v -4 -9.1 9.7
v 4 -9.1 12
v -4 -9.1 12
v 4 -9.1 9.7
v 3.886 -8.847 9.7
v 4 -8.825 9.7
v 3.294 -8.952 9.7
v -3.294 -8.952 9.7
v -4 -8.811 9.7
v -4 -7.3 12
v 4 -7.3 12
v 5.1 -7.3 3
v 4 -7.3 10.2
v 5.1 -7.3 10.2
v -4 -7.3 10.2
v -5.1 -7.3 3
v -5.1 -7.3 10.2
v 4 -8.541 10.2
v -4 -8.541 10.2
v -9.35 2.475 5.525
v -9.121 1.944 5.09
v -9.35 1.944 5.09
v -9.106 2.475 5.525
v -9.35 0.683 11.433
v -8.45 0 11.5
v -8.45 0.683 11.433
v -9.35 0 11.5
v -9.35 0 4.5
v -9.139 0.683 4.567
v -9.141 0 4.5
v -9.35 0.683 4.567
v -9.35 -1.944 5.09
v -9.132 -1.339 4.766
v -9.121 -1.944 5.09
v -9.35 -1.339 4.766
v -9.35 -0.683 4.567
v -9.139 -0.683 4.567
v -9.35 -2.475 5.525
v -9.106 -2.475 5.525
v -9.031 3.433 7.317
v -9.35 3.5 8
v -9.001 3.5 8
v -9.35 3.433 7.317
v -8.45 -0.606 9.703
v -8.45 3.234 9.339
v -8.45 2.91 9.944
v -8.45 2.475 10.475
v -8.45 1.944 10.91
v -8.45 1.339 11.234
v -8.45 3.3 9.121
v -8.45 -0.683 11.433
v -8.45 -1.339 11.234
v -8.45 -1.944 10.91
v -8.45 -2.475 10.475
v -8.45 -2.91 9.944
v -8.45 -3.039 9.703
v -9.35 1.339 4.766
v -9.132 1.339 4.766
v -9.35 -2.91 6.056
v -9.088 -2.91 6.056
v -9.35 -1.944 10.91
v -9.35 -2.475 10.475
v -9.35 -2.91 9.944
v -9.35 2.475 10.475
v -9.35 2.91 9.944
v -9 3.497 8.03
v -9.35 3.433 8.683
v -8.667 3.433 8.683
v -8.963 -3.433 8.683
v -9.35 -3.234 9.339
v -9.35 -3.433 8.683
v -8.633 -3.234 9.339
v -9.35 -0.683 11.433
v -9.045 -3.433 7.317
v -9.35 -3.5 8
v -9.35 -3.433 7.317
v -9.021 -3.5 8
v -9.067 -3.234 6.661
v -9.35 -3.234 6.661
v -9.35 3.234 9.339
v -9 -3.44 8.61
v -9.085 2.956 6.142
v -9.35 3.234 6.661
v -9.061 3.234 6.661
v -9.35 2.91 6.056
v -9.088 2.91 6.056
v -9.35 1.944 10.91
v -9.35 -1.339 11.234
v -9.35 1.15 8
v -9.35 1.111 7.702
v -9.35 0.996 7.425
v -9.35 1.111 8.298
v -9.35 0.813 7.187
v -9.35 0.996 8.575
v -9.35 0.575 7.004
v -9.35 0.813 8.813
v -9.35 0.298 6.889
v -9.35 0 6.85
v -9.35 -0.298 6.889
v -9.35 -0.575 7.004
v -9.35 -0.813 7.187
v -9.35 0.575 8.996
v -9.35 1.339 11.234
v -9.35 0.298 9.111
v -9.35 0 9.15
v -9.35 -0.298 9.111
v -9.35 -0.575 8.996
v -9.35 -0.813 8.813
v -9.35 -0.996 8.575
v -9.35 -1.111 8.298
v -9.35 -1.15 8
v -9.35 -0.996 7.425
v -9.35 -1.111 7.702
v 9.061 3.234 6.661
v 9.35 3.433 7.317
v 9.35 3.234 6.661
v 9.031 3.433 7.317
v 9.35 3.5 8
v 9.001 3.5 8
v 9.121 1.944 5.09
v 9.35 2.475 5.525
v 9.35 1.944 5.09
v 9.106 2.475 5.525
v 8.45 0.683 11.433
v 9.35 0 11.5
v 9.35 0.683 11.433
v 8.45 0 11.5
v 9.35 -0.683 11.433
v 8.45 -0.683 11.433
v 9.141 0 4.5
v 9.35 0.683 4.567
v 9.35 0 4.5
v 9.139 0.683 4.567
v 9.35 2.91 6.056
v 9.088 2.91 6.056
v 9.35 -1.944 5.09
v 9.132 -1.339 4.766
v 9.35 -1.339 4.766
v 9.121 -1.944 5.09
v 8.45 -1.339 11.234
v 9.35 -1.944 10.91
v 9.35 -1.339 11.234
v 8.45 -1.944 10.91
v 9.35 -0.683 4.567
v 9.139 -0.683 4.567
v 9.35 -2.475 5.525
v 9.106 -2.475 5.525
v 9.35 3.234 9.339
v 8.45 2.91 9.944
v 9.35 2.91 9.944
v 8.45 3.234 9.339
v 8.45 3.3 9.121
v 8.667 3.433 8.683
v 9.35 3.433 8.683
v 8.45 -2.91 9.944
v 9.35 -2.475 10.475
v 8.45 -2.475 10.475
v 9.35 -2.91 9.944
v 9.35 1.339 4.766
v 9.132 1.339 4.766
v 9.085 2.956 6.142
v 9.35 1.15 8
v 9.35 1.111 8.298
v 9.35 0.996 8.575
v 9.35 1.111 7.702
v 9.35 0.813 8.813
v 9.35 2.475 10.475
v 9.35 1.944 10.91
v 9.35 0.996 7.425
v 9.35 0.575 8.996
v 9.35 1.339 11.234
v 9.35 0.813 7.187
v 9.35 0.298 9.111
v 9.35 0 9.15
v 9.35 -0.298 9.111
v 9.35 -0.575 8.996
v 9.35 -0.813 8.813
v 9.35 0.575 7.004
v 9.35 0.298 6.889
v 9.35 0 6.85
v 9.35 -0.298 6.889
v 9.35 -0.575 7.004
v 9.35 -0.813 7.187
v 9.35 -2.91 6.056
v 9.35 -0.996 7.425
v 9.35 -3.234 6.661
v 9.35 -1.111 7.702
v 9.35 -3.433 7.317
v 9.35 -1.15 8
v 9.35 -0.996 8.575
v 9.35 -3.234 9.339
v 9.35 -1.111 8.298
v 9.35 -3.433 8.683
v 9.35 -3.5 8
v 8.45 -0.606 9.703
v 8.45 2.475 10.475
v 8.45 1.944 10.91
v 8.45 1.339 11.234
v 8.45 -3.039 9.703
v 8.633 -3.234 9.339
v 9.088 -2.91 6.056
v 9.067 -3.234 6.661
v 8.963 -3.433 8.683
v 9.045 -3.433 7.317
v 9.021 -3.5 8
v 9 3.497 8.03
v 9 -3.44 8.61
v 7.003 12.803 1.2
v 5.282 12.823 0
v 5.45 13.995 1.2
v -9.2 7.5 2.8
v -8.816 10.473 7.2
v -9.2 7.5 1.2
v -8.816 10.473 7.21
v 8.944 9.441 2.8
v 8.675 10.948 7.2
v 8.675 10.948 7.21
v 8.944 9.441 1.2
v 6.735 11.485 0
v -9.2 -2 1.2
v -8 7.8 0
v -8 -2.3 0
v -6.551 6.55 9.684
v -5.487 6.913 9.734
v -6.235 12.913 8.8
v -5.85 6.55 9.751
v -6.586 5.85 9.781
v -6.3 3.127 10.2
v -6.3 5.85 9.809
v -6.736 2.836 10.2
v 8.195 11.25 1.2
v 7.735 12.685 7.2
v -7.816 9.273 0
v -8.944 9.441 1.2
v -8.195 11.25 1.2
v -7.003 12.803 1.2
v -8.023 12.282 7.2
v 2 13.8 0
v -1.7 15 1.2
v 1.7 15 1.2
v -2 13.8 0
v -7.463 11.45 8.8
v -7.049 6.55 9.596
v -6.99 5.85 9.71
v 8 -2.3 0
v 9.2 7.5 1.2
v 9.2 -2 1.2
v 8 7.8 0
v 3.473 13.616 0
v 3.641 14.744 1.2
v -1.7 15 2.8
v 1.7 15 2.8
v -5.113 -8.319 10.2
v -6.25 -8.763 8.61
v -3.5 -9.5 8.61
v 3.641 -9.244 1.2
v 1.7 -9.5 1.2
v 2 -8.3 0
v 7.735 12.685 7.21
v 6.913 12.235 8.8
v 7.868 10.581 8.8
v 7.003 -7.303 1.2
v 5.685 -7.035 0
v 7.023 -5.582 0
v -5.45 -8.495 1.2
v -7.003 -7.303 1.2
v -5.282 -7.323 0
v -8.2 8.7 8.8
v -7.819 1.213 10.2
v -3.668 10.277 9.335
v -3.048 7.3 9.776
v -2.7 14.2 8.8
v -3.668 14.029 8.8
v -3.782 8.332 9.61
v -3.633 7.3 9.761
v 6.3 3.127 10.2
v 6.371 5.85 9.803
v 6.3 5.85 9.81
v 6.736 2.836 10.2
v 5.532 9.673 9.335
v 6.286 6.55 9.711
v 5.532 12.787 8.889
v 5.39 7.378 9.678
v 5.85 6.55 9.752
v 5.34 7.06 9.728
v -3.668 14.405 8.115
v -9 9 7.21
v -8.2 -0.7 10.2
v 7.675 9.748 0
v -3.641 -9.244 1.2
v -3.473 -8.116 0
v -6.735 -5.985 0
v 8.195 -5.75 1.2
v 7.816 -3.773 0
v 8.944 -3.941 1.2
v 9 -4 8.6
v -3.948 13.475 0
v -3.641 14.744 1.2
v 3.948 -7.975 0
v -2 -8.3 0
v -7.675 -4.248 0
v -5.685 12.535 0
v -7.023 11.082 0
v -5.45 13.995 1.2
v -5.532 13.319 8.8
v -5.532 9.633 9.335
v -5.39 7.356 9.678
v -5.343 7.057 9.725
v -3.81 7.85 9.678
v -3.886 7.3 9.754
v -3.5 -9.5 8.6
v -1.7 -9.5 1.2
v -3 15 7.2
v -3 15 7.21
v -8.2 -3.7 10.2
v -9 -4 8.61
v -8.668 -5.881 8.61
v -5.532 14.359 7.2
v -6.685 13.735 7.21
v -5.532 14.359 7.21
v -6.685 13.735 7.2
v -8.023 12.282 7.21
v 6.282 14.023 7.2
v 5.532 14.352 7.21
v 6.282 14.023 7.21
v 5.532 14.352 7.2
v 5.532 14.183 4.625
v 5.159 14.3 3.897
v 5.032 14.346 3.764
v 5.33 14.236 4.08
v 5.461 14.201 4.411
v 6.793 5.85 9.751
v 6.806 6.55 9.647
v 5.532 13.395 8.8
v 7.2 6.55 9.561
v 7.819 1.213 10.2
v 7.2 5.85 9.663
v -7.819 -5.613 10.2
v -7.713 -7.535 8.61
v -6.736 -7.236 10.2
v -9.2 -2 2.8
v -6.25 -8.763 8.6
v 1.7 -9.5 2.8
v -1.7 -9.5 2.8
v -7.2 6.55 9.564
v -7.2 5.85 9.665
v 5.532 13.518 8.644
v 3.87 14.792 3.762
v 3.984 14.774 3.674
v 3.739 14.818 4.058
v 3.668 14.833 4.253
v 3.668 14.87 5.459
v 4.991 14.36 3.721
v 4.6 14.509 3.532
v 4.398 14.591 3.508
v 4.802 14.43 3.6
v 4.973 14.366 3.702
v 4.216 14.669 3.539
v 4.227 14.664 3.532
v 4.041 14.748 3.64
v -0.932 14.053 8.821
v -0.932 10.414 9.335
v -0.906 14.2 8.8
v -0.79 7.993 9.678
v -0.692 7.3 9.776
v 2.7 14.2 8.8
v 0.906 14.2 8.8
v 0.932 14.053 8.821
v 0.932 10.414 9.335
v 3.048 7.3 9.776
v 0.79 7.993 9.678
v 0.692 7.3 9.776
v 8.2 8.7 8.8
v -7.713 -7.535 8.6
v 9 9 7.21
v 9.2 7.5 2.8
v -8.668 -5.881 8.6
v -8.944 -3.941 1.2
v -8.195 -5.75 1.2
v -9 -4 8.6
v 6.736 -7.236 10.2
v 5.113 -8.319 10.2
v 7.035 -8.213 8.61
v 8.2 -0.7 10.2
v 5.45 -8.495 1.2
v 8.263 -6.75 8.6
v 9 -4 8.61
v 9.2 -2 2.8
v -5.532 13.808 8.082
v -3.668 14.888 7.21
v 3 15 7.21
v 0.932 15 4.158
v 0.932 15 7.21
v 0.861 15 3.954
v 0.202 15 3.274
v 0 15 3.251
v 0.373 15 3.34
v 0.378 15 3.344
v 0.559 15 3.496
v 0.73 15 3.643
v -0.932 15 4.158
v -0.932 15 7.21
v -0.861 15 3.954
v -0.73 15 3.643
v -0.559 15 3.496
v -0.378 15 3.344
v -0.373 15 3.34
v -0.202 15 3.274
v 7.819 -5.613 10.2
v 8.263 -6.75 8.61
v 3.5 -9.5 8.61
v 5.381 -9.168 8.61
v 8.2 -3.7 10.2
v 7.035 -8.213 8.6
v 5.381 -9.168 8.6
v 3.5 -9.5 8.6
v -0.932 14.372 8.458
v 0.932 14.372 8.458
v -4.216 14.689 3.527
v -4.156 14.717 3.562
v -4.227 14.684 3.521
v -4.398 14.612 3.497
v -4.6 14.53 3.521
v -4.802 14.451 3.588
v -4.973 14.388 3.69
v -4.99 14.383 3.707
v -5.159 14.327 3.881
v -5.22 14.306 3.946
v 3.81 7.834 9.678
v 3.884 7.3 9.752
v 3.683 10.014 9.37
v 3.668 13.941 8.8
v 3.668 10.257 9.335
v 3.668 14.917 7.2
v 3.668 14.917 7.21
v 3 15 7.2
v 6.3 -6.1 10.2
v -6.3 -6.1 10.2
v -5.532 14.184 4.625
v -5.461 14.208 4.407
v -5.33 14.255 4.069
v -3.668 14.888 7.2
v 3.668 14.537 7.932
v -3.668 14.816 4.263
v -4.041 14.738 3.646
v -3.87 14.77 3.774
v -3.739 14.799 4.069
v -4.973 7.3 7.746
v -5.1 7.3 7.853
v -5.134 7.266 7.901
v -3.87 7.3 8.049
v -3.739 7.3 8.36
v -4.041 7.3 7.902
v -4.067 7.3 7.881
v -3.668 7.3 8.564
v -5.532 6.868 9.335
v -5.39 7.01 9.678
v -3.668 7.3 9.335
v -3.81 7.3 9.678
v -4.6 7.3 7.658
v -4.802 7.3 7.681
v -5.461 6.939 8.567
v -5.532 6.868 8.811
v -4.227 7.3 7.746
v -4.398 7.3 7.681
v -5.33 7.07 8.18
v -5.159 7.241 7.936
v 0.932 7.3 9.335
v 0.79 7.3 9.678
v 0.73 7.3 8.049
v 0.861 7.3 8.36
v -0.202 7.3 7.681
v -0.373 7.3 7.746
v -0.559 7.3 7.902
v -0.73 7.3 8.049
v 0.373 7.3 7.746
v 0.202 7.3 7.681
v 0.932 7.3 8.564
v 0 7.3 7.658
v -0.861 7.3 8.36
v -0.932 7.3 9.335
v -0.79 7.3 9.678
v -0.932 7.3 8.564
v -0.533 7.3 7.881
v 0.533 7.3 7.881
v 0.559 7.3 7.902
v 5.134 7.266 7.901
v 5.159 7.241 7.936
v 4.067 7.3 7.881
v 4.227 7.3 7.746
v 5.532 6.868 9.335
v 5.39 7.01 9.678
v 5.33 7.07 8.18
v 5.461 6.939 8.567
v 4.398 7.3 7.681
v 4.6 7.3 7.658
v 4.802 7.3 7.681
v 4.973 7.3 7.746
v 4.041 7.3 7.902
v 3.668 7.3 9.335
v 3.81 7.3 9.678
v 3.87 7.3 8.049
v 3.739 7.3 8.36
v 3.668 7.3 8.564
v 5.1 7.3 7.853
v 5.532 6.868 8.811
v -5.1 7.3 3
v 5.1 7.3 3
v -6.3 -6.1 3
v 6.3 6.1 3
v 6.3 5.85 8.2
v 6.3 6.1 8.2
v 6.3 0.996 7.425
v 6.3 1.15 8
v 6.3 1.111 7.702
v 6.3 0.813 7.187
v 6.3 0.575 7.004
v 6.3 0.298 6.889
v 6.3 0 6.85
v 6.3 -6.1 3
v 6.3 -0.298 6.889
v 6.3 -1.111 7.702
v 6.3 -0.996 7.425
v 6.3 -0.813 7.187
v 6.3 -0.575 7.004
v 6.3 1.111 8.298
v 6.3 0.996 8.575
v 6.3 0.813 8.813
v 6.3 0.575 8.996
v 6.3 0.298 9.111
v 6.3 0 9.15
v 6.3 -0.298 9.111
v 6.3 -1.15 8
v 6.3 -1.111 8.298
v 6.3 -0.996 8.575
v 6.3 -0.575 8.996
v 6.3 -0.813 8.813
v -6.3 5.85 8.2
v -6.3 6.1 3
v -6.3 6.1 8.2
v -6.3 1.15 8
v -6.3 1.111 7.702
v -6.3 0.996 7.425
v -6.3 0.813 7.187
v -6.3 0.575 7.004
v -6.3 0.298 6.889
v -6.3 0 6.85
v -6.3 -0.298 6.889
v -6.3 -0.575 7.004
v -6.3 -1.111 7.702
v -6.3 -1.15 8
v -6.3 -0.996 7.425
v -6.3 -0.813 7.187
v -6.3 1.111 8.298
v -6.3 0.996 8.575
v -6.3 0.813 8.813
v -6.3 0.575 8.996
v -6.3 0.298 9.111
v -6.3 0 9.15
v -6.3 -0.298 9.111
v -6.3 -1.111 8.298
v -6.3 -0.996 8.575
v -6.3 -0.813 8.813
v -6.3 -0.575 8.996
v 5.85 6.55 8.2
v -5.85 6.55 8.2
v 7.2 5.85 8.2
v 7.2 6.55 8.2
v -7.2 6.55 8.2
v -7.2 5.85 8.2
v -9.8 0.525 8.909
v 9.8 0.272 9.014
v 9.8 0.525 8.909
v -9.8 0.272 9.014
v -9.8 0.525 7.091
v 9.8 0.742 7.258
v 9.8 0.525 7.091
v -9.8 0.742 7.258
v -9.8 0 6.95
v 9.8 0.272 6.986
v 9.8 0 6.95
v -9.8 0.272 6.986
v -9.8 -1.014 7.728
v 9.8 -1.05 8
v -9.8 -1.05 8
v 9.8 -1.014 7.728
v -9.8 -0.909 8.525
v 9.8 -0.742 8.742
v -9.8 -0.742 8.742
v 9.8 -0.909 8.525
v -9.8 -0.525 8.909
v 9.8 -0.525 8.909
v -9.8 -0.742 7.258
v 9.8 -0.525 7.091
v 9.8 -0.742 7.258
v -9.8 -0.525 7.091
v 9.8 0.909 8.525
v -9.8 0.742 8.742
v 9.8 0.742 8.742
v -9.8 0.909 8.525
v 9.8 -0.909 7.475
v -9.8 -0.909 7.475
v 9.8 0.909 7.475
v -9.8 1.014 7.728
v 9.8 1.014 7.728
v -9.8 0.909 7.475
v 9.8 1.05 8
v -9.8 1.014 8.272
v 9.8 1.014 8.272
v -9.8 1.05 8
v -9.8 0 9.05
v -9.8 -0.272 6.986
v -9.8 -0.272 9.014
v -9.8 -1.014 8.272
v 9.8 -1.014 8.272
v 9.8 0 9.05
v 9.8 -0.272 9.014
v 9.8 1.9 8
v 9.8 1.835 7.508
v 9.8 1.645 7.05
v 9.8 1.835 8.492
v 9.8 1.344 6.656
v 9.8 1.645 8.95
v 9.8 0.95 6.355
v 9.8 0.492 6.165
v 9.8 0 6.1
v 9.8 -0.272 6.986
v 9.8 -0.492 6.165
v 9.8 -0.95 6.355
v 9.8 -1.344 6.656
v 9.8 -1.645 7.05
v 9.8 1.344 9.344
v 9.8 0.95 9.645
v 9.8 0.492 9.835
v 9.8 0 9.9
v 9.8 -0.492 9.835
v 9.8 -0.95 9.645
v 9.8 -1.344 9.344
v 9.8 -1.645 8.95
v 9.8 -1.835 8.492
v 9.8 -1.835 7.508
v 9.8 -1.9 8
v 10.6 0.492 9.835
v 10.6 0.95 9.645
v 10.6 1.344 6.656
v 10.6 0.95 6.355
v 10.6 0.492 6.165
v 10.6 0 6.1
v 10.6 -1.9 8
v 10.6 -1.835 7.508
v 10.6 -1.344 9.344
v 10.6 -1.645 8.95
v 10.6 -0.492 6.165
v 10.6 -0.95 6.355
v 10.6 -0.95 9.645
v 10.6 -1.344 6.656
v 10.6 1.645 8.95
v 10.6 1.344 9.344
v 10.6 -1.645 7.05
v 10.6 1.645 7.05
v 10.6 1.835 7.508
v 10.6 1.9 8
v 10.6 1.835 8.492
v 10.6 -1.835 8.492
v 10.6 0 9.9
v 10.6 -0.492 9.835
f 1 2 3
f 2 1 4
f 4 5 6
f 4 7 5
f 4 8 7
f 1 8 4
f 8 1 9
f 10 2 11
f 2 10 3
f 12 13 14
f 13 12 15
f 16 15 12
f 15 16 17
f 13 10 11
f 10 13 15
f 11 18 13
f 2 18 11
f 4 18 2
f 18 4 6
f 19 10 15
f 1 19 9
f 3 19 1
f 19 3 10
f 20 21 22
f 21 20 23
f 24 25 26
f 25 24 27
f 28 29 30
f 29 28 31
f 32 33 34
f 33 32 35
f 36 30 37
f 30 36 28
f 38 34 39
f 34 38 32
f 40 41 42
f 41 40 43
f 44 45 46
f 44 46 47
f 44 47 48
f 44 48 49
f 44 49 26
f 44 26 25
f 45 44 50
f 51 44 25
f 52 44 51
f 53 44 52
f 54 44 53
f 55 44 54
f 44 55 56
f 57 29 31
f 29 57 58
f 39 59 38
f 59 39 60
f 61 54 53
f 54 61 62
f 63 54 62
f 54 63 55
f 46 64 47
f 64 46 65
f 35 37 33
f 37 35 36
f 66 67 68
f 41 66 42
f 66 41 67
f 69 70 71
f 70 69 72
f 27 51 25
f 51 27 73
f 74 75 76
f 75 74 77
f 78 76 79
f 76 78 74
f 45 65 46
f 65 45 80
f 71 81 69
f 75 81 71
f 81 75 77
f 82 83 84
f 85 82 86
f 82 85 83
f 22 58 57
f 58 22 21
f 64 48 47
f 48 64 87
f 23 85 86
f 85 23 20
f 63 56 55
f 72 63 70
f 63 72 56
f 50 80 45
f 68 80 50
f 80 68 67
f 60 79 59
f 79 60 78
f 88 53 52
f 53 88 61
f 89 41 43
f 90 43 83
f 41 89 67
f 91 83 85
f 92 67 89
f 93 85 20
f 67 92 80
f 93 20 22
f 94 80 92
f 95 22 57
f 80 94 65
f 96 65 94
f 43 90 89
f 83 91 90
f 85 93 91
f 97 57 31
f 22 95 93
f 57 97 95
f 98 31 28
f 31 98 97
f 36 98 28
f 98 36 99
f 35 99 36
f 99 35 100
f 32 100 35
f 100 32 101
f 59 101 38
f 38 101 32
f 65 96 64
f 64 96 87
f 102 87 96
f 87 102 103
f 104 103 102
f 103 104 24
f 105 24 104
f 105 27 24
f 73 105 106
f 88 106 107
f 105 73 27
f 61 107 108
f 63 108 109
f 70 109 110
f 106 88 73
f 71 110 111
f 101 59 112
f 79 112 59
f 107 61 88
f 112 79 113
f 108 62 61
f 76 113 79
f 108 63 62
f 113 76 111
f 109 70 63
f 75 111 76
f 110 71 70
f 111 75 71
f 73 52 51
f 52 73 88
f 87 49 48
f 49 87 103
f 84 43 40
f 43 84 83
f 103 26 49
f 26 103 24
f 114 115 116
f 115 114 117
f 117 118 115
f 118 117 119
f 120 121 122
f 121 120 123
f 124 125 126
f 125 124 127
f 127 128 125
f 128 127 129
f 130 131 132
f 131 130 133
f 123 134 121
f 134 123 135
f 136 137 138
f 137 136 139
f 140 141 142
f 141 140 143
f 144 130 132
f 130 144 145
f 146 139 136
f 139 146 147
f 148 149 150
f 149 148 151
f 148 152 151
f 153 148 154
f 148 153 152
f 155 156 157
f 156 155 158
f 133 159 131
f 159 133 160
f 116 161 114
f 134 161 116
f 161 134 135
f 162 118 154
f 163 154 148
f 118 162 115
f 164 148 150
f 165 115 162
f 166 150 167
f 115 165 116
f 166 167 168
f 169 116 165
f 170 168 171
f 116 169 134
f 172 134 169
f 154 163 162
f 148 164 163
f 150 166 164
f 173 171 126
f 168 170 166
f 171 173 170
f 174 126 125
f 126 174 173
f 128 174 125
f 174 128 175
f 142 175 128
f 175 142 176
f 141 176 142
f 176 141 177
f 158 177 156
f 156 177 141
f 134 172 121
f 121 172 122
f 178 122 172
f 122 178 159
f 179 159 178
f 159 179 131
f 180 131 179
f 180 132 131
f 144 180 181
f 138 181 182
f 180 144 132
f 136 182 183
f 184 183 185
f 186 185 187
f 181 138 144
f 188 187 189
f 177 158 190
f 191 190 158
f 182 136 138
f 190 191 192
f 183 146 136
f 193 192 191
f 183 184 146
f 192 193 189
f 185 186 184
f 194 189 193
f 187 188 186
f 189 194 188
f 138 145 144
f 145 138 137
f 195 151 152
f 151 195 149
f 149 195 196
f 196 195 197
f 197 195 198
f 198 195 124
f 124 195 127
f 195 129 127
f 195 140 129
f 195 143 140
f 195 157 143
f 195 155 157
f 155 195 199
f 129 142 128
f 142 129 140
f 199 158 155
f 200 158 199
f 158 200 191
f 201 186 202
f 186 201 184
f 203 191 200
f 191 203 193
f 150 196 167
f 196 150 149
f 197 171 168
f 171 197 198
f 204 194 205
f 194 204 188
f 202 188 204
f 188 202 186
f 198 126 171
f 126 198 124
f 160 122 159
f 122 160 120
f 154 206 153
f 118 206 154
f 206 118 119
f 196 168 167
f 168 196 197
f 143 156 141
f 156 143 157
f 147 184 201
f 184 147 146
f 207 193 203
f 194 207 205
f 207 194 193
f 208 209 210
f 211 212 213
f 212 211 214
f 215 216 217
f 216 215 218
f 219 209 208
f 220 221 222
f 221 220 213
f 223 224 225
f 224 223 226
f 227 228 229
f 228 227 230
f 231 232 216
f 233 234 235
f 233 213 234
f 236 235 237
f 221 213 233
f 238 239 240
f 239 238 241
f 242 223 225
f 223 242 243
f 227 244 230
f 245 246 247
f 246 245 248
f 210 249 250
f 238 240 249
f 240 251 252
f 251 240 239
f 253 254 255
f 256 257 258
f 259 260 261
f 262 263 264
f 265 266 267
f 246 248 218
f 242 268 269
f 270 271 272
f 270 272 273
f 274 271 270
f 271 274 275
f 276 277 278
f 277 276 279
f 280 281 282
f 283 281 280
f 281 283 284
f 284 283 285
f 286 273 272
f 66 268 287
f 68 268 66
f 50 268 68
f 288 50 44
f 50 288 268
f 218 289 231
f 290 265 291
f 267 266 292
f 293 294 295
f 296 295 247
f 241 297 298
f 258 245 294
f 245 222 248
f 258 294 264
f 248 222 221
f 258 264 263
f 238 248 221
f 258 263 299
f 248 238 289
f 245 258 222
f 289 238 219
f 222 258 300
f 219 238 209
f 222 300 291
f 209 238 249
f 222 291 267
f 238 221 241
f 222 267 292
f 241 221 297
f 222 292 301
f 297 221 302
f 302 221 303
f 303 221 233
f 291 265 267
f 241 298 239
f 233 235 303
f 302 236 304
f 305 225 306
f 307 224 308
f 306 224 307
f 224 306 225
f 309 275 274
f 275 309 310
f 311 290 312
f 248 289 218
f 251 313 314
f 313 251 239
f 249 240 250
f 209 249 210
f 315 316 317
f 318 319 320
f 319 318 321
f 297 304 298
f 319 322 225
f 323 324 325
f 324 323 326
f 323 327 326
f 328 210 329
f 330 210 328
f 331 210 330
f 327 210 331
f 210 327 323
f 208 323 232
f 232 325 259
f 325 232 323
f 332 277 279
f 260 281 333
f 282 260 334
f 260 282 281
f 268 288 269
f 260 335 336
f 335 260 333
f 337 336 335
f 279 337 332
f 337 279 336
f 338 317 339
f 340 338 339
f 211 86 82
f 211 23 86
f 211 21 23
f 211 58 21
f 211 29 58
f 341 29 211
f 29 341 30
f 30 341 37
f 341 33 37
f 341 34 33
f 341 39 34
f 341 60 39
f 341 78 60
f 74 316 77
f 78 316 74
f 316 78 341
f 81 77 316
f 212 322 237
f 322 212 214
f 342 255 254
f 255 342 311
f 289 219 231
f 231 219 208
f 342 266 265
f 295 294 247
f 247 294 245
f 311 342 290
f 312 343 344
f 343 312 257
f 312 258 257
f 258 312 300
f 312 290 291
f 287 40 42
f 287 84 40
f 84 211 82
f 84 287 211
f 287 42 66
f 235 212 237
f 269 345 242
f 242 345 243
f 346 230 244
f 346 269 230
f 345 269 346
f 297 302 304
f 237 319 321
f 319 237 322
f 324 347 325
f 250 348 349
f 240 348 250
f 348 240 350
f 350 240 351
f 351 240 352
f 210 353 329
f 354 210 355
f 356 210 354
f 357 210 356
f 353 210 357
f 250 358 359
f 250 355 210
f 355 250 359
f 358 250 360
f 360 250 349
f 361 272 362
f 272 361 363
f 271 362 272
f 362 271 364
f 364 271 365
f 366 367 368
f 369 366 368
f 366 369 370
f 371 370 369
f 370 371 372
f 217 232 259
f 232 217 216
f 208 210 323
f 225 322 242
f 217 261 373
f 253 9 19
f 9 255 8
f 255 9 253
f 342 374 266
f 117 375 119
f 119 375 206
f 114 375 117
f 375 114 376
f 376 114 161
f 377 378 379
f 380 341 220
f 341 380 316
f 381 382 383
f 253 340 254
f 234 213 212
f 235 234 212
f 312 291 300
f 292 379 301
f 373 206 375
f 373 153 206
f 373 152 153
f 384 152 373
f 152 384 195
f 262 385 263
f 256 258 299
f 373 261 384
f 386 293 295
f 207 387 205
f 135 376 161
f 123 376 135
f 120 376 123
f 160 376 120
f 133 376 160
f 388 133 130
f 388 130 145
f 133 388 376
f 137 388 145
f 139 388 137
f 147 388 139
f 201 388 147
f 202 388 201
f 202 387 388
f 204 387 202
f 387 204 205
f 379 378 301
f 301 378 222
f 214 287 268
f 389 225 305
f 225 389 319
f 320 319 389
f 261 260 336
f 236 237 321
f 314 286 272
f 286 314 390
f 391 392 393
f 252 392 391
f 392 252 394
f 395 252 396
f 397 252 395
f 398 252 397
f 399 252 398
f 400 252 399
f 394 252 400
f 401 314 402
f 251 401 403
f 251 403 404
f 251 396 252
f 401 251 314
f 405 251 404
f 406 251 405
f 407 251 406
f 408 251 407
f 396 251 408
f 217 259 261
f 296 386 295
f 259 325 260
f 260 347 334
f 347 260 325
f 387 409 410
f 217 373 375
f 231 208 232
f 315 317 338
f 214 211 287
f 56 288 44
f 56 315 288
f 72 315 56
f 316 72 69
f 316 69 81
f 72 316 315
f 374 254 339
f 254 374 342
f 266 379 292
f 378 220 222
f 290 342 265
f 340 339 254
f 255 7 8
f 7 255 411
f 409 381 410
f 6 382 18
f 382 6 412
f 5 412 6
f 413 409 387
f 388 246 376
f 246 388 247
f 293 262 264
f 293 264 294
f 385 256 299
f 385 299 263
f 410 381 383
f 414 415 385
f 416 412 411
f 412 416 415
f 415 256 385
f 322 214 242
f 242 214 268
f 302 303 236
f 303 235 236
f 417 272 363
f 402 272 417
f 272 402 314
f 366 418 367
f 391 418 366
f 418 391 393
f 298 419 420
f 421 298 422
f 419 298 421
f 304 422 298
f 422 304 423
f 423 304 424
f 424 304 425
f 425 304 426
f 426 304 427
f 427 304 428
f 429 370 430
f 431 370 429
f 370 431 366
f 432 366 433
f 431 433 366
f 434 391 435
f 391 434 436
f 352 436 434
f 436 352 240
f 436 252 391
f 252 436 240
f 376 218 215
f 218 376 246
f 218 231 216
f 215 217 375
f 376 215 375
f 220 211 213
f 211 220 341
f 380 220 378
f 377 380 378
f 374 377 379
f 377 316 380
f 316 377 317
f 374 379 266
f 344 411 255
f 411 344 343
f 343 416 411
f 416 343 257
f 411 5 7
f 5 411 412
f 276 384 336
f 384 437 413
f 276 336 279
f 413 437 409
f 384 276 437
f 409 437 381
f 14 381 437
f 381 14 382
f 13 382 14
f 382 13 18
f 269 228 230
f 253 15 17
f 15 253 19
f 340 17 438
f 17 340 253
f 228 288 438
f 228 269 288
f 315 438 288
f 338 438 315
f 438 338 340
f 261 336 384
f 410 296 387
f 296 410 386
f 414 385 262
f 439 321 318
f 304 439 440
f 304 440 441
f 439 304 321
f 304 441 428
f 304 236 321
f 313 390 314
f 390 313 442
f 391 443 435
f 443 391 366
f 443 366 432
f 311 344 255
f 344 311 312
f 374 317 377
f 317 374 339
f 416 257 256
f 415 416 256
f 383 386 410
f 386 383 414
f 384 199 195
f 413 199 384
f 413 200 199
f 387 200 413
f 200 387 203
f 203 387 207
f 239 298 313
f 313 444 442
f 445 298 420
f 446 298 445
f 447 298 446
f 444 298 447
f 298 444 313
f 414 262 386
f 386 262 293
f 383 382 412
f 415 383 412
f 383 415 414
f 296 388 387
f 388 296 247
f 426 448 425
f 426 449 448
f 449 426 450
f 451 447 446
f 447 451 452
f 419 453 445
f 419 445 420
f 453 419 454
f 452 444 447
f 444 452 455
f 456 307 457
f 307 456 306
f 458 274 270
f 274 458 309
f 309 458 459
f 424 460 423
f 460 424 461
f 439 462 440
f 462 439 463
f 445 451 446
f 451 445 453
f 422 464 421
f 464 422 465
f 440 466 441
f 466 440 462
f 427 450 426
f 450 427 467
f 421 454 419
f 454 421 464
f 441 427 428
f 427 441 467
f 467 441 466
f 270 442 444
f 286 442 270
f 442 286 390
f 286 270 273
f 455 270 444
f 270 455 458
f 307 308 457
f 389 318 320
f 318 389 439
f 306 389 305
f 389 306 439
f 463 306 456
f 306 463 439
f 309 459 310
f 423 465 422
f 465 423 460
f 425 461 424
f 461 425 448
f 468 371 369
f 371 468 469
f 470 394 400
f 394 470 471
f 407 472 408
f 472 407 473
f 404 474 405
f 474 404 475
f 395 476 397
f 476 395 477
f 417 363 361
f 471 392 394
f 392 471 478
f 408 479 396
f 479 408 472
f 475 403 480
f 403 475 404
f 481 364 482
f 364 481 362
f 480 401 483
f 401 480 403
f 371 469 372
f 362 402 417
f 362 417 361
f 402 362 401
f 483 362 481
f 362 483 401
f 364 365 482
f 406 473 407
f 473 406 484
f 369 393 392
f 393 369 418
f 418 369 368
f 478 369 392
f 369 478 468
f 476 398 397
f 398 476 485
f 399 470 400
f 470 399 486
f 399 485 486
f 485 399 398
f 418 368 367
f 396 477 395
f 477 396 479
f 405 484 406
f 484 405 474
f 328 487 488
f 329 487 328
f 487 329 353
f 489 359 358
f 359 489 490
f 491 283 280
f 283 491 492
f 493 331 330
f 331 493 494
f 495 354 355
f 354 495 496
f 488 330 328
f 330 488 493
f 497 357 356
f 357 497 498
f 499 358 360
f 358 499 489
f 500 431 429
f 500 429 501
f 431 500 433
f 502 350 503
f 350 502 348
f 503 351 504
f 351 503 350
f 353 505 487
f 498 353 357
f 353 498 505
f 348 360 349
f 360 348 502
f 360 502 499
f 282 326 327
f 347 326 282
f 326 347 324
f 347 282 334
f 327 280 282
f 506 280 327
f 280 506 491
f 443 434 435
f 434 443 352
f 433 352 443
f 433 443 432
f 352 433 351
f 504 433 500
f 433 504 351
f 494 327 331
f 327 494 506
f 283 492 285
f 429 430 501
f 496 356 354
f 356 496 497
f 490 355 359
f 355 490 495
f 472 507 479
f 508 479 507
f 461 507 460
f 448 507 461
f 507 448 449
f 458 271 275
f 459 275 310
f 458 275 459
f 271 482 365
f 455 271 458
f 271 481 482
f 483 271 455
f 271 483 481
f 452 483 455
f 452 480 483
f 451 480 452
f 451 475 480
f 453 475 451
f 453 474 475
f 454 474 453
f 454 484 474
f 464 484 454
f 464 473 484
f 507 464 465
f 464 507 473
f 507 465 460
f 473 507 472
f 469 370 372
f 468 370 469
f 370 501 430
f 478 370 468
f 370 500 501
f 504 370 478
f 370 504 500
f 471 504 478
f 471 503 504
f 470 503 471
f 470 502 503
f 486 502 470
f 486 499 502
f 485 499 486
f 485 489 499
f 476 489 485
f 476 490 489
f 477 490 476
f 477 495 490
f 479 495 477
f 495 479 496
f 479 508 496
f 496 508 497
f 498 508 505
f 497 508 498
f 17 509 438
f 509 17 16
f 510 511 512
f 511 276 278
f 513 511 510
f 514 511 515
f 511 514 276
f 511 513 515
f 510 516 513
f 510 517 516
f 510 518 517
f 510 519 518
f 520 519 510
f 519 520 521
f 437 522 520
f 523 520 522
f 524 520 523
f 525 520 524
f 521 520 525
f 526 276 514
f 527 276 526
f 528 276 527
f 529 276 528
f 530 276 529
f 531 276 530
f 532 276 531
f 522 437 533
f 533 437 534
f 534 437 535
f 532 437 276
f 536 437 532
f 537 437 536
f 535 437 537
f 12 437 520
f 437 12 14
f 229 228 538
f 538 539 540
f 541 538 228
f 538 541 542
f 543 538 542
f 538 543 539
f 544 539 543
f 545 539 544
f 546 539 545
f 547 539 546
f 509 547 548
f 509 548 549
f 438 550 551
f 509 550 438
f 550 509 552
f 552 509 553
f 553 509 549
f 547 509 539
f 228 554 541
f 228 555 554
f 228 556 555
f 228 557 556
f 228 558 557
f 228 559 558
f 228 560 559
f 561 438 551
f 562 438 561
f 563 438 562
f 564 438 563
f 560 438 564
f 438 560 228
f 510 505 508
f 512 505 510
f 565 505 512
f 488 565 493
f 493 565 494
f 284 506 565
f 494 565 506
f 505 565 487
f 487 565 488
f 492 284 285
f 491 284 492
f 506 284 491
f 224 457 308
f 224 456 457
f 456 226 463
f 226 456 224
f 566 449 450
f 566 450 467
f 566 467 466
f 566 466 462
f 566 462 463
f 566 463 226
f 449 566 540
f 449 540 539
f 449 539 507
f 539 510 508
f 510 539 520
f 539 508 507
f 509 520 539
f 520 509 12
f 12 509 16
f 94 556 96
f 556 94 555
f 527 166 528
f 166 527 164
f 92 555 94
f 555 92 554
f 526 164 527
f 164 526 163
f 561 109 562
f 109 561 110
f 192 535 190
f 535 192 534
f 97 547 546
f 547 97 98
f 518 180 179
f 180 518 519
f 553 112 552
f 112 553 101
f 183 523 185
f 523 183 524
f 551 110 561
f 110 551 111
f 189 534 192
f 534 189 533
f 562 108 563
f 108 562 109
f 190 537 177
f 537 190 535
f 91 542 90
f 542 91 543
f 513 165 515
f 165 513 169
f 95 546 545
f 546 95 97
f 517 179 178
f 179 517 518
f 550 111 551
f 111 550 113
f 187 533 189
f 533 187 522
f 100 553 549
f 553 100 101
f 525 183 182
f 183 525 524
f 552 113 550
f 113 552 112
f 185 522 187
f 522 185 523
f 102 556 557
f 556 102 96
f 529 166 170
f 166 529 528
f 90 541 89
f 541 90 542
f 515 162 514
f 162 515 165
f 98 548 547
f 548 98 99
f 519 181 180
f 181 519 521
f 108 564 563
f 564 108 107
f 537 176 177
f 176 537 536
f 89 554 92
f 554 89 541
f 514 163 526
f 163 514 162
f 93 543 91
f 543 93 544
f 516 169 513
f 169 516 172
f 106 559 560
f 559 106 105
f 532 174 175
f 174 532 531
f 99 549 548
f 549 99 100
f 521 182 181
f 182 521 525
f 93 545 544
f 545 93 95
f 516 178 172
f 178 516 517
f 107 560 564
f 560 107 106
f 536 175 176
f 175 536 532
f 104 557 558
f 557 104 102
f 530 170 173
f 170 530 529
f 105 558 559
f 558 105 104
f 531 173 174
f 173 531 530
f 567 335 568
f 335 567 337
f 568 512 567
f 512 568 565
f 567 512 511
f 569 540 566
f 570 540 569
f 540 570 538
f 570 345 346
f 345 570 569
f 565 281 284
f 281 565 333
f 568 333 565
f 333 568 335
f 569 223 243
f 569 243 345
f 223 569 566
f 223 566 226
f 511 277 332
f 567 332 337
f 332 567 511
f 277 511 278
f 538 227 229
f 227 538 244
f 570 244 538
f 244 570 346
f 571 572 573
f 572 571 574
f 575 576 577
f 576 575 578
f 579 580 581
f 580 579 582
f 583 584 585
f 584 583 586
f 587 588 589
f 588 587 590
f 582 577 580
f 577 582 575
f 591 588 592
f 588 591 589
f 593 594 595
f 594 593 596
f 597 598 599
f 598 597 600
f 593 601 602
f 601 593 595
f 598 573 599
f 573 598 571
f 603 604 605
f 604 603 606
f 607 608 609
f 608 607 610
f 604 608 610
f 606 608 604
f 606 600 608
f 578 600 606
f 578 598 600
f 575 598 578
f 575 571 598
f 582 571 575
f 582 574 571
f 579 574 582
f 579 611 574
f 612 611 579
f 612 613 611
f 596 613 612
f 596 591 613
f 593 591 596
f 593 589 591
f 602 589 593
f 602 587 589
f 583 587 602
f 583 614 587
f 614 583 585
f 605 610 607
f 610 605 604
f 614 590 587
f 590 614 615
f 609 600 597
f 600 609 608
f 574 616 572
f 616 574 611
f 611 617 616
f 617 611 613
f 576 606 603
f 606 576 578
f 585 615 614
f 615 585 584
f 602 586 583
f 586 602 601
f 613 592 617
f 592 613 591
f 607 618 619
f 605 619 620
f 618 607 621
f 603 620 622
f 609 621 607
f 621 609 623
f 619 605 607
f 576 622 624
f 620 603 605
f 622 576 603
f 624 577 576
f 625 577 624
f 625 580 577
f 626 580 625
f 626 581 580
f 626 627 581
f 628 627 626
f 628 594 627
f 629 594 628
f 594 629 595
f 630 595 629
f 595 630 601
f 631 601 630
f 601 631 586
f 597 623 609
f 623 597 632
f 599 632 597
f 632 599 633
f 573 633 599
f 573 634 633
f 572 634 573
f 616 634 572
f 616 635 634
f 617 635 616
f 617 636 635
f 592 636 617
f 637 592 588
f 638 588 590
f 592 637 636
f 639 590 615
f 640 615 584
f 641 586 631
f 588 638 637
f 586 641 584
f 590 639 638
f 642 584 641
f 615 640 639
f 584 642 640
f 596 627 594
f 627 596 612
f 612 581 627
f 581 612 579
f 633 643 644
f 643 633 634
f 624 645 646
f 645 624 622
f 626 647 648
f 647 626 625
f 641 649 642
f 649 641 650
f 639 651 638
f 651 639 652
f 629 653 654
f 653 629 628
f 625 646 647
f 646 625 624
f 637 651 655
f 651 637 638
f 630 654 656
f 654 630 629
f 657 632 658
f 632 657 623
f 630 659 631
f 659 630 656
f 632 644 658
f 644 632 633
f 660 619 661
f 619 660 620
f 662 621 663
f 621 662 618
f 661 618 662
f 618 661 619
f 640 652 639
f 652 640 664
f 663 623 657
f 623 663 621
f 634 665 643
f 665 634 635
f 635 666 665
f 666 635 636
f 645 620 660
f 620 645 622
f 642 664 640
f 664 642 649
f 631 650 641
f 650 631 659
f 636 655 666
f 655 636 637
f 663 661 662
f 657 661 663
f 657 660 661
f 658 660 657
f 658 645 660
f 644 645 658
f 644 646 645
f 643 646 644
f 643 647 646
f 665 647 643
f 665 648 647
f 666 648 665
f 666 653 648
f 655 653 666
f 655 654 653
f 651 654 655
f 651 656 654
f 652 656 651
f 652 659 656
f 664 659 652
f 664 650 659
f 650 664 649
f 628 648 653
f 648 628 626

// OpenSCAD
// Minimal feet for the Bittle (concept only): one smooth piece, one color. A short rounded cuff over the
// stock foot, flowing into a flat sole. Estimates, not measured on a robot.
// Four-tooth feet: four small contact teeth instead of a pad. Stability in all four directions with a small footprint.
//   W  whole paw   : a paw from the ground up: domed palm, toe lobes with small claws, a flared wrist
//   P  paw         : a palm pad with four toe pads in an arc at the front, like a paw print
//   Q  cross       : teeth front, back, left, right (24 mm along the body, 26 mm across)
//   R  compact X   : teeth at the four corners of a 17 mm square (22 x 22 mm)
//   S  lifted X    : like R, with the two front teeth raised 1.2 mm so a front tooth does not catch the ground
// Every tooth is a short, tapered wedge with a chamfered tip, low and smooth so it does not snag.
// Stability feet: centered under the foot, no change to the stance.
//   H  wide pad    : a flat 26 x 22 mm sole, a larger contact patch in both directions
//   J  round plate : a round 26 mm sole with grip rings, the same footing whichever way the foot turns
//   K  long pad    : a 34 x 14 mm sole along the body, for fore and aft stability, toe-up
//   L  flex skirt  : a thin 30 mm skirt around a small core that bends to follow uneven ground
// Stance feet (offset outward):
//   E  stance +10  : a short, wide sole (20 x 18 mm) shifted 10 mm outward, toe-up
//   F  round       : a round sole (24 mm across), 3 mm outward
//   G  short ski   : a 30 x 12 mm sole along the body, 4 mm outward, toe-up
// The cuff covers the bottom 10 mm of the stock foot (14 x 12 mm). A flexing tab on each side has a small pin that
// snaps into the hole in the foot (position and size guessed). Printed in PETG or nylon.
// Local frame: Z up, the sole on the bed at Z = 0, X = lateral (+X = outward, away from the body), Y = along the body.
// The toe is +Y (the head end on the robot).
// Set style = "M" for the mech paw (like the robot wolf), "N" for the lion paw, "V" for the slipper foot (like your photos), "W" for the whole-paw foot, "P" for the paw base only, "all" for Q-S side by side, "pads" for H-L, "stance" for E-G, or one letter.
style = "M";
section = false;     // true: cut in half along the body to show the socket

color_main = "#e8641b";

foot_l = 14;         // along the body (Y here)
foot_w = 12;         // across the body (X here)
cap_h = 10;          // how far the cuff covers the foot
clear = 0.3;         // clearance around the foot, per side
wall = 2.0;          // cuff wall
floor_t = 3;         // thickness of the base under the foot
hole_d = 2.5;        // hole in the stock foot (guess)
hole_z = 5;          // height of the hole above the sole's top face (guess)
pin_d = hole_d - 0.4;
pin_in = 1.0;        // how far the pin tip goes into the right arm
tab_w = 7;           // flexing tab in each side wall
slit = 0.6;

in_w = foot_w + 2*clear;
in_l = foot_l + 2*clear;
sock_w = in_w + 2*wall;
sock_l = in_l + 2*wall;
top_z = floor_t + cap_h;

module rrect(l, w, r, h) {       // rounded rectangle, l along Y, w along X, corner radius r, height h
    linear_extrude(h) offset(r) square([w - 2*r, l - 2*r], center = true);
}
module stadium(l, w, h) { rrect(l, w, w/2 - 0.05, h); }       // a rounded oblong: the ends are half circles

module cuff_outer() {            // a short oval cuff, slightly narrower at the top
    hull() {
        translate([0, 0, floor_t - 0.01]) stadium(sock_l, sock_w, 0.01);
        translate([0, 0, top_z - 0.01]) stadium(sock_l - 1.2, sock_w - 1.2, 0.01);
    }
}
module socket_hole() { translate([0, 0, floor_t]) stadium(in_l, in_w, cap_h + 1); }

module slab(off, l, w, r) {      // the flat sole with softly rounded edges
    translate([off, 0, 0]) hull() {
        rrect(l - 2.4, w - 2.4, max(r - 1.2, 0.6), 0.01);
        translate([0, 0, 1.2]) rrect(l, w, r, floor_t - 2.4);
        translate([0, 0, floor_t - 0.01]) rrect(l - 2.4, w - 2.4, max(r - 1.2, 0.6), 0.01);
    }
}
module sole_top(off, l, w) { translate([off, 0, floor_t - 1.2]) rrect(l - 2.4, w - 2.4, 1.6, 0.02); }

module blend(off, l, w) {        // a smooth flow from the sole's top edge up into the cuff
    hull() {
        translate([0, 0, floor_t - 0.01]) stadium(sock_l, sock_w, 2.5);
        sole_top(off, l, w);
    }
}
module toe_wedge(off, l, w) {    // lifts the front 6 mm of the sole's underside
    translate([off, 0, 0]) hull() {
        translate([-w, l/2 - 6, -0.01]) cube([2*w, 0.01, 0.01]);
        translate([-w, l/2 + 0.5, -0.01]) cube([2*w, 0.01, 1.5]);
    }
}

module rect_foot(off, l, w) {
    difference() {
        union() { cuff_outer(); slab(off, l, w, 3); blend(off, l, w); }
        socket_hole();
        toe_wedge(off, l, w);
        tab_slits();
    }
    snap_pins();
}
module round_foot(off, d, rings = false) {
    difference() {
        union() {
            cuff_outer();
            translate([off, 0, 0]) hull() {
                cylinder(d = d - 2.4, h = 0.01, $fn = 64);
                translate([0, 0, 1.2]) cylinder(d = d, h = floor_t - 2.4, $fn = 64);
                translate([0, 0, floor_t - 0.01]) cylinder(d = d - 2.4, h = 0.01, $fn = 64);
            }
            hull() {
                translate([0, 0, floor_t - 0.01]) stadium(sock_l, sock_w, 2.5);
                translate([off, 0, floor_t - 1.2]) cylinder(d = d - 3, h = 0.02, $fn = 64);
            }
        }
        socket_hole();
        tab_slits();
        if (rings) for (r = [d/2 - 3, d/2 - 6]) translate([off, 0, -0.01]) difference() {
            cylinder(r = r + 0.5, h = 0.7, $fn = 64);
            translate([0, 0, -1]) cylinder(r = r - 0.5, h = 3, $fn = 64);
        }
    }
    snap_pins();
}

// a thin skirt around a small core
module skirt_foot(d, core) {
    difference() {
        union() {
            cuff_outer();
            hull() {
                cylinder(d = d, h = 1.2, $fn = 64);
                cylinder(d = core, h = floor_t, $fn = 64);
            }
            hull() {
                translate([0, 0, floor_t - 0.01]) stadium(sock_l, sock_w, 2.5);
                cylinder(d = core - 1, h = floor_t - 0.5, $fn = 64);
            }
        }
        socket_hole();
        tab_slits();
    }
    snap_pins();
}

// four-tooth foot: tips = [x, y, raise] of each tooth tip center
module tooth(x, y, raise = 0, tip = 6.5) {
    hull() {
        translate([0, 0, 0]) stadium(sock_l - 3, sock_w - 3, floor_t);                         // the hub under the cuff
        translate([x, y, raise]) cylinder(d = tip - 1.4, h = 0.01, $fn = 32);                  // chamfered tip, on the ground
        translate([x, y, raise + 0.7]) cylinder(d = tip, h = floor_t - 1.2, $fn = 32);
    }
}
// no cuff: two thin arms rise from the hub, one on each side of the foot. Each has a pin that clips into the hole.
// Bend the arms apart to put the foot on or take it off.
arm_t = 2.4;         // arm thickness
arm_w = 8;           // arm width along the body
arm_top = 2.2;       // the arm reaches this far above the hole center (the pin radius is 1.05)
module clip_arms() {
    // the left arm is fixed and carries a pin that goes all the way through the hole in the foot. The right arm is
    // the latch: bend it outward, slide the foot onto the pin from the right, then let the arm go. The tip of the pin
    // snaps into a blind hole in the right arm.
    z0 = floor_t + hole_z;
    difference() {
        union() {
            for (sx = [-1, 1])
                translate([sx * (in_w/2 + arm_t/2), 0, floor_t + (hole_z + arm_top)/2])
                    hull() {                       // rounded top
                        cube([arm_t, arm_w, hole_z + arm_top - 1], center = true);
                        translate([0, 0, (hole_z + arm_top)/2 - 0.5]) rotate([0, 90, 0]) cylinder(d = arm_w, h = arm_t, center = true, $fn = 24);
                    }
            // the pin: from inside the left arm, across the foot, into the right arm
            translate([-in_w/2 - 0.5, 0, z0]) rotate([0, 90, 0]) cylinder(d = pin_d, h = in_w + 0.5 + pin_in, $fn = 24);
        }
        // living hinge: the right arm is thinned to 0.8 mm at its base so it can fold outward and down
        translate([in_w/2 + 0.8 + (arm_t - 0.8 + 0.2)/2, 0, floor_t + 0.75]) cube([arm_t - 0.8 + 0.2, arm_w + 2, 1.5], center = true);   // removes the outer 1.6 mm, leaves 0.8
        // blind hole in the right arm that catches the tip of the pin (a little larger than the pin)
        translate([in_w/2 + arm_t - 0.01, 0, z0]) rotate([0, -90, 0]) cylinder(d = pin_d + 0.3, h = pin_in + 0.5 + 0.01, $fn = 24);
    }
}
// a very short cuff: a low rim around the toe and heel of the foot. It is open at the sides, where the arms are,
// so the right arm can still fold out.
cuff_h = 4;          // how far the rim rises above the base
cuff_lean = 1.2;     // the cuff leans inward: its outside is this much closer to the foot at the top, per side
module short_cuff() {
    difference() {
        union() {
            stadium(sock_l, sock_w, floor_t);
            hull() {                                    // the outer face leans inward toward the top
                translate([0, 0, floor_t - 0.01]) stadium(sock_l, sock_w, 0.01);
                translate([0, 0, floor_t + cuff_h - 0.01]) stadium(sock_l - 2*cuff_lean, sock_w - 2*cuff_lean, 0.01);
            }
        }
        translate([0, 0, floor_t]) stadium(in_l, in_w, cuff_h + 1);
        for (sx = [-1, 1]) translate([sx * sock_w/2, 0, floor_t + cuff_h/2 + 0.5]) cube([wall*2 + 2, arm_w + 1.6, cuff_h + 1], center = true);
    }
}
// backstop: a taller, thicker wall at the heel, up to 2 mm above the pin. The foot pivots on the pin, and its lower
// rear edge rests on this wall, so it cannot swing backward (toward the heel). Swinging forward is not limited.
back_h = 7;          // how far the backstop rises above the base (the pin is 5 mm above the base)
back_t = 3;          // thickness of the backstop wall
module backstop() {
    intersection() {
        difference() {
            stadium(sock_l + 2, sock_w, floor_t + back_h);
            translate([0, 0, floor_t]) stadium(in_l, in_w, back_h + 1);
        }
        translate([-sock_w, -(sock_l + 2)/2 - 1, 0]) cube([2*sock_w, back_t + 1, floor_t + back_h + 1]);
    }
}
// paw base: a palm pad and four toe pads in an arc at the toe end (+Y)
toe_d = 6.5;
toes = [[-9.5, 6.5], [-3.5, 11.5], [3.5, 11.5], [9.5, 6.5]];
module pad_disc(d, h = floor_t) {            // a round pad with a chamfered bottom edge
    cylinder(d1 = d - 1.2, d2 = d, h = 0.7, $fn = 40);
    translate([0, 0, 0.7 - 0.01]) cylinder(d = d, h = h - 0.7 + 0.01, $fn = 40);
}
module paw_base() {
    translate([0, -2, 0]) scale([1, 0.85, 1]) pad_disc(21);                       // the palm
    for (t = toes) hull() {                                                       // each toe joins the palm
        translate([t[0], t[1], 0]) pad_disc(toe_d);
        translate([t[0] * 0.45, 2.5, 0]) pad_disc(5);
    }
}
// whole-paw foot (style W): domed palm, domed toe lobes with small raised claws, and a flared wrist around the foot.
// The attachment is the same as the other four-tooth feet: the left arm and pin, the folding right arm, the heel backstop.
claw_len = 2.2;      // the claws are blunt and raised off the ground so they do not catch
module paw_dome_base() {
    hull() {                                                          // the palm
        translate([0, -2, 0]) scale([1, 0.85, 1]) pad_disc(21);
        translate([0, -2, floor_t]) scale([1, 0.85, 0.35]) sphere(d = 19, $fn = 40);
    }
    for (t = toes) {
        hull() {                                                      // a toe lobe, joined to the palm
            translate([t[0], t[1], 0]) pad_disc(toe_d);
            translate([t[0], t[1], floor_t]) scale([1, 1, 0.55]) sphere(d = toe_d - 0.6, $fn = 24);
            translate([t[0] * 0.45, 2.5, 0]) pad_disc(5);
        }
        translate([t[0], t[1] + toe_d/2 - 0.8, 1.9]) rotate([-90, 0, 0])      // a blunt claw at the toe tip
            cylinder(d1 = 2.4, d2 = 1.0, h = claw_len, $fn = 16);
    }
}
module paw_wrist() {                                                  // a flared wrist that leans in toward the top
    hull() {
        translate([0, 0, floor_t - 0.01]) stadium(sock_l + 3, sock_w + 4, 0.01);
        translate([0, 0, floor_t + cuff_h + 1 - 0.01]) stadium(sock_l - 2*cuff_lean, sock_w - 2*cuff_lean, 0.01);
    }
}
module paw_foot() {
    difference() {
        union() { paw_dome_base(); paw_wrist(); backstop(); }
        translate([0, 0, floor_t]) stadium(in_l, in_w, 14);                       // the pocket for the foot
        for (sx = [-1, 1]) translate([sx * sock_w/2, 0, floor_t + 6]) cube([16, arm_w + 1.6, 12], center = true);   // room for the arms
    }
    stadium(sock_l - 3, in_w + 2*arm_t, floor_t);        // the plate the foot sits on
    clip_arms();
}

// slipper foot (style V), after the printed foot in your photos: a rounded-rectangle body that is tall at the heel and
// lower toward the toe, with a rectangular window for the foot, open at the top, and three ribs on the toe.
// The foot drops in from above, then a pin goes through one cheek, the hole in the foot and the other cheek.
// The heel wall of the window is the backstop.
rib_n = 3;
module slipper_foot() {
    ow = in_w + 2*arm_t;                                            // outside width: two 2.4 mm cheeks
    z_h = floor_t + hole_z + 3;                                     // heel top
    z_t = floor_t + 3.5;                                            // toe top
    color(color_main) difference() {
        union() {
            hull() {                                                // the body: base, heel top, toe top
                translate([0, 2.5, 0]) rrect(27, ow, 3, 0.01);
                translate([0, -3.5, z_h - 0.01]) rrect(15, ow - 1, 2.5, 0.01);
                translate([0, 12, z_t - 0.01]) rrect(8, ow - 1, 2.5, 0.01);
            }
            for (i = [0 : rib_n - 1]) translate([0, 9.9 + i * 2.3, z_t - 0.05])      // ribs on the toe
                rrect(1.8, ow - 5, 0.7, 1.6);
        }
        translate([0, 0, floor_t]) rrect(in_l, in_w, 1.2, 20);                       // the window for the foot, open at the top
        translate([0, 0, floor_t + hole_z]) rotate([0, 90, 0]) cylinder(d = pin_d + 0.2, h = 30, center = true, $fn = 24);   // pin hole
    }
    color("#2c2d31") translate([0, 0, floor_t + hole_z]) rotate([0, 90, 0]) {       // the pin, with a head on the +X side
        cylinder(d = pin_d, h = ow + 0.5, center = true, $fn = 24);
        translate([0, 0, ow/2 + 0.25]) cylinder(d = 3.6, h = 0.8, $fn = 24);
    }
}

// lion paw (style N): the slipper's attachment (window open at the top, one pin through both cheeks, heel wall as the
// backstop) in a chunky paw: a tall furry wrist at the heel, a big domed palm, four fat toes with claws.
lion_toes = [[-10.5, 7.5], [-4.2, 13], [4.2, 13], [10.5, 7.5]];
lion_td = 8;
module lion_paw() {
    ow = in_w + 2*arm_t;
    z_h = floor_t + hole_z + 3;
    color(color_main) difference() {
        union() {
            hull() {                                                      // the wrist block that holds the window
                translate([0, -1.5, 0]) rrect(in_l + 7, ow, 4, 0.01);
                translate([0, -2.5, z_h - 0.01]) rrect(in_l + 3, ow - 2, 3, 0.01);
            }
            hull() {                                                      // the palm
                translate([0, 0, 0]) scale([1, 0.8, 1]) pad_disc(24);
                translate([0, 0, floor_t]) scale([1, 0.8, 0.35]) sphere(d = 21, $fn = 40);
            }
            for (t = lion_toes) {
                hull() {                                                  // a fat toe, joined to the palm
                    translate([t[0], t[1], 0]) pad_disc(lion_td);
                    translate([t[0], t[1], floor_t]) scale([1, 1, 0.6]) sphere(d = lion_td - 0.6, $fn = 24);
                    translate([t[0] * 0.5, 3, 0]) pad_disc(6);
                }
                translate([t[0], t[1] + lion_td/2 - 0.8, 2.2]) rotate([-90, 0, 0])
                    cylinder(d1 = 2.8, d2 = 1.0, h = 3, $fn = 16);        // a blunt claw
            }
            for (i = [0 : 2]) translate([0, -2.5 - (in_l + 3)/2 - 0.2, 3 + i * 2.6]) rotate([0, 0, 0])
                scale([1, 0.35, 1]) rotate([0, 90, 0]) cylinder(d = 3, h = ow - 3 - i, center = true, $fn = 20);   // fur ridges on the heel
        }
        translate([0, 0, floor_t]) rrect(in_l, in_w, 1.2, 20);                       // the window for the foot, open at the top
        translate([0, 0, floor_t + hole_z]) rotate([0, 90, 0]) cylinder(d = pin_d + 0.2, h = 30, center = true, $fn = 24);
    }
    color("#2c2d31") translate([0, 0, floor_t + hole_z]) rotate([0, 90, 0]) {       // the pin, with a head on the +X side
        cylinder(d = pin_d, h = ow + 0.5, center = true, $fn = 24);
        translate([0, 0, ow/2 + 0.25]) cylinder(d = 3.6, h = 0.8, $fn = 24);
    }
}

// mech paw (style M), after the black feet of the robot wolf in your photo: a chunky rounded boot with a flat sole, a
// rounded toe, a taller heel and a window for the foot, with a pivot ring where the pin goes through.
// Same attachment as V and N: the foot drops into the window, one pin through both cheeks and the hole in the foot.
leg_w = 8;           // the width of the leg at the ankle, which the backstop lip matches: 8 mm in the shank mesh (7 to 9.4 mm over the ankle); your 12 mm foot is wider
module mech_paw() {
    ow = in_w + 2*arm_t + 1;                                         // outside width
    z_h = floor_t + hole_z + 2.2;                                    // heel top: lower, with less material behind the pin
    z_t = floor_t + 5.8;                                             // toe top: higher, so the front is flatter
    color("#26272b") difference() {
        union() {
            hull() {                                                              // softly rounded all round
                translate([0, 2.75, 0]) rrect(24.5 - 2.4, ow - 2.4, 6, 0.01);                // sole edge
                translate([0, 2.75, 1.2]) rrect(24.5, ow, 7.5, 1.6);                         // the full outline, with straight sides
                translate([0, -2.2, z_h - 1.6]) rrect(13 + 1.6, ow - 2 + 1.6, 5.5, 0.01);    // heel top, rounded edge
                translate([0, -2.2, z_h - 0.01]) rrect(13, ow - 2, 5, 0.01);
                translate([0, 8.2, z_t - 1.6]) rrect(12 + 1.6, ow - 2 + 1.6, 6, 0.01);       // toe top, rounded edge
                translate([0, 8.2, z_t - 0.01]) rrect(12, ow - 2, 5.5, 0.01);
            }
            // subtle backstop: a low lip behind the leg, as wide as the leg, following the rounded heel contour of the window
            intersection() {
                difference() {
                    translate([0, 0, z_h - 0.5]) rrect(in_l + 3.6, in_w + 3.6, 2.4, 2.3);
                    translate([0, 0, z_h - 1]) rrect(in_l, in_w, 1.2, 4);
                }
                translate([-leg_w/2, -in_l/2 - 5, z_h - 1]) cube([leg_w, 5 + 0.01, 4]);
            }
            for (sx = [-1, 1]) translate([sx * (ow/2 - 0.3), 0, floor_t + hole_z]) rotate([0, 90, 0])
                cylinder(d = 7, h = 0.9, center = true, $fn = 32);                  // the pivot rings
        }
        translate([0, 0, floor_t]) rrect(in_l, in_w, 1.2, 20);                       // the window for the foot
        translate([0, 0, floor_t + hole_z]) rotate([0, 90, 0]) cylinder(d = pin_d + 0.2, h = 30, center = true, $fn = 24);
        translate([0, 6.2, z_t + 0.4]) cube([ow - 4, 0.7, 2], center = true);      // a crease across the toe base (0.6 mm deep, not through the sides)
        for (gx = [-4.6, 0, 4.6]) hull() {                                            // three grooves split the toe into four
            translate([gx, 6.6, z_t + 0.35]) sphere(d = 1.9, $fn = 16);
            translate([gx, 13.6, z_t + 0.35]) sphere(d = 1.9, $fn = 16);
            translate([gx, 14.7, z_t - 0.9]) sphere(d = 1.9, $fn = 16);
            translate([gx, 15.4, z_t - 2.6]) sphere(d = 1.9, $fn = 16);
            translate([gx, 15.6, z_t - 4.8]) sphere(d = 1.9, $fn = 16);
        }
    }
    color("#c9ccd1") translate([0, 0, floor_t + hole_z]) rotate([0, 90, 0]) {       // the pin, with a head on the +X side
        cylinder(d = pin_d, h = ow + 1.2, center = true, $fn = 24);
        translate([0, 0, ow/2 + 0.6]) cylinder(d = 3.8, h = 0.8, $fn = 24);
    }
}

module teeth_foot(tips, paw = false) {
    union() {
        short_cuff();
        backstop();
        if (paw) paw_base();
        else for (t = tips) tooth(t[0], t[1], t[2]);
        stadium(sock_l - 3, in_w + 2*arm_t, floor_t);        // the plate the foot sits on
        clip_arms();
    }
}
module teeth_foot_cuff(tips) {
    difference() {
        union() {
            cuff_outer();
            hull() {
                translate([0, 0, floor_t - 0.01]) stadium(sock_l, sock_w, 2.5);
                stadium(sock_l - 3, sock_w - 3, floor_t - 0.5);
            }
            for (t = tips) tooth(t[0], t[1], t[2]);
        }
        socket_hole();
        tab_slits();
    }
    snap_pins();
}

// a flexing tab in each side wall (a U-shaped slit, attached at the bottom) with a snap pin on its inside face
module tab_slits() {
    zb = floor_t + 1.5; zt = top_z - 0.8;
    for (sx = [-1, 1]) {
        for (sy = [-1, 1]) translate([sx * sock_w/2, sy * (tab_w/2 + slit/2), (zb + zt)/2]) cube([6, slit, zt - zb], center = true);
        translate([sx * sock_w/2, 0, zt - slit/2]) cube([6, tab_w + 2*slit, slit], center = true);
    }
}
module snap_pins() {
    for (sx = [-1, 1])
        translate([sx * in_w/2, 0, floor_t + hole_z]) rotate([0, -sx * 90, 0])
            cylinder(d1 = pin_d, d2 = pin_d - 0.8, h = pin_len, $fn = 24);
}

module foot(s = "E") {
    // M, N and V set their own colors (body and pin), so they are not inside the one-color wrapper
    if (s == "M") mech_paw();
    else if (s == "N") lion_paw();
    else if (s == "V") slipper_foot();
    else color(color_main) {
        if (s == "E") rect_foot(10, 20, 18);
        else if (s == "G") rect_foot(4, 30, 12);
        else if (s == "F") round_foot(3, 24);
        else if (s == "H") rect_foot(0, 26, 22);
        else if (s == "J") round_foot(0, 26, true);
        else if (s == "K") rect_foot(0, 34, 14);
        else if (s == "L") skirt_foot(30, 18);
        else if (s == "W") paw_foot();
        else if (s == "P") teeth_foot([], true);
        else if (s == "Q") teeth_foot([[10.5, 0, 0], [-10.5, 0, 0], [0, 9.5, 0], [0, -9.5, 0]]);
        else if (s == "R") teeth_foot([[8.5, 8.5, 0], [-8.5, 8.5, 0], [8.5, -8.5, 0], [-8.5, -8.5, 0]]);
        else teeth_foot([[8.5, 8.5, 1.2], [-8.5, 8.5, 1.2], [8.5, -8.5, 0], [-8.5, -8.5, 0]]);
    }
}

module label(t) { color("#9a9a96") translate([-8, -26, 0]) linear_extrude(0.6) text(t, size = 5); }

module show() {
    if (style == "all") for (i = [0 : 2]) translate([i * 44, 0, 0]) {
        foot(["Q", "R", "S"][i]);
        label(["Q  cross", "R  compact X", "S  lifted X"][i]);
    }
    else if (style == "pads") for (i = [0 : 3]) translate([i * 44, 0, 0]) {
        foot(["H", "J", "K", "L"][i]);
        label(["H  wide pad", "J  round plate", "K  long pad", "L  flex skirt"][i]);
    }
    else if (style == "stance") for (i = [0 : 2]) translate([i * 44, 0, 0]) {
        foot(["E", "F", "G"][i]);
        label(["E  stance +10", "F  round", "G  short ski"][i]);
    }
    else foot(style);
}

if (section) intersection() { show(); translate([-60, -60, -1]) cube([260, 60, 60]); }   // keep Y < 0
else show();
